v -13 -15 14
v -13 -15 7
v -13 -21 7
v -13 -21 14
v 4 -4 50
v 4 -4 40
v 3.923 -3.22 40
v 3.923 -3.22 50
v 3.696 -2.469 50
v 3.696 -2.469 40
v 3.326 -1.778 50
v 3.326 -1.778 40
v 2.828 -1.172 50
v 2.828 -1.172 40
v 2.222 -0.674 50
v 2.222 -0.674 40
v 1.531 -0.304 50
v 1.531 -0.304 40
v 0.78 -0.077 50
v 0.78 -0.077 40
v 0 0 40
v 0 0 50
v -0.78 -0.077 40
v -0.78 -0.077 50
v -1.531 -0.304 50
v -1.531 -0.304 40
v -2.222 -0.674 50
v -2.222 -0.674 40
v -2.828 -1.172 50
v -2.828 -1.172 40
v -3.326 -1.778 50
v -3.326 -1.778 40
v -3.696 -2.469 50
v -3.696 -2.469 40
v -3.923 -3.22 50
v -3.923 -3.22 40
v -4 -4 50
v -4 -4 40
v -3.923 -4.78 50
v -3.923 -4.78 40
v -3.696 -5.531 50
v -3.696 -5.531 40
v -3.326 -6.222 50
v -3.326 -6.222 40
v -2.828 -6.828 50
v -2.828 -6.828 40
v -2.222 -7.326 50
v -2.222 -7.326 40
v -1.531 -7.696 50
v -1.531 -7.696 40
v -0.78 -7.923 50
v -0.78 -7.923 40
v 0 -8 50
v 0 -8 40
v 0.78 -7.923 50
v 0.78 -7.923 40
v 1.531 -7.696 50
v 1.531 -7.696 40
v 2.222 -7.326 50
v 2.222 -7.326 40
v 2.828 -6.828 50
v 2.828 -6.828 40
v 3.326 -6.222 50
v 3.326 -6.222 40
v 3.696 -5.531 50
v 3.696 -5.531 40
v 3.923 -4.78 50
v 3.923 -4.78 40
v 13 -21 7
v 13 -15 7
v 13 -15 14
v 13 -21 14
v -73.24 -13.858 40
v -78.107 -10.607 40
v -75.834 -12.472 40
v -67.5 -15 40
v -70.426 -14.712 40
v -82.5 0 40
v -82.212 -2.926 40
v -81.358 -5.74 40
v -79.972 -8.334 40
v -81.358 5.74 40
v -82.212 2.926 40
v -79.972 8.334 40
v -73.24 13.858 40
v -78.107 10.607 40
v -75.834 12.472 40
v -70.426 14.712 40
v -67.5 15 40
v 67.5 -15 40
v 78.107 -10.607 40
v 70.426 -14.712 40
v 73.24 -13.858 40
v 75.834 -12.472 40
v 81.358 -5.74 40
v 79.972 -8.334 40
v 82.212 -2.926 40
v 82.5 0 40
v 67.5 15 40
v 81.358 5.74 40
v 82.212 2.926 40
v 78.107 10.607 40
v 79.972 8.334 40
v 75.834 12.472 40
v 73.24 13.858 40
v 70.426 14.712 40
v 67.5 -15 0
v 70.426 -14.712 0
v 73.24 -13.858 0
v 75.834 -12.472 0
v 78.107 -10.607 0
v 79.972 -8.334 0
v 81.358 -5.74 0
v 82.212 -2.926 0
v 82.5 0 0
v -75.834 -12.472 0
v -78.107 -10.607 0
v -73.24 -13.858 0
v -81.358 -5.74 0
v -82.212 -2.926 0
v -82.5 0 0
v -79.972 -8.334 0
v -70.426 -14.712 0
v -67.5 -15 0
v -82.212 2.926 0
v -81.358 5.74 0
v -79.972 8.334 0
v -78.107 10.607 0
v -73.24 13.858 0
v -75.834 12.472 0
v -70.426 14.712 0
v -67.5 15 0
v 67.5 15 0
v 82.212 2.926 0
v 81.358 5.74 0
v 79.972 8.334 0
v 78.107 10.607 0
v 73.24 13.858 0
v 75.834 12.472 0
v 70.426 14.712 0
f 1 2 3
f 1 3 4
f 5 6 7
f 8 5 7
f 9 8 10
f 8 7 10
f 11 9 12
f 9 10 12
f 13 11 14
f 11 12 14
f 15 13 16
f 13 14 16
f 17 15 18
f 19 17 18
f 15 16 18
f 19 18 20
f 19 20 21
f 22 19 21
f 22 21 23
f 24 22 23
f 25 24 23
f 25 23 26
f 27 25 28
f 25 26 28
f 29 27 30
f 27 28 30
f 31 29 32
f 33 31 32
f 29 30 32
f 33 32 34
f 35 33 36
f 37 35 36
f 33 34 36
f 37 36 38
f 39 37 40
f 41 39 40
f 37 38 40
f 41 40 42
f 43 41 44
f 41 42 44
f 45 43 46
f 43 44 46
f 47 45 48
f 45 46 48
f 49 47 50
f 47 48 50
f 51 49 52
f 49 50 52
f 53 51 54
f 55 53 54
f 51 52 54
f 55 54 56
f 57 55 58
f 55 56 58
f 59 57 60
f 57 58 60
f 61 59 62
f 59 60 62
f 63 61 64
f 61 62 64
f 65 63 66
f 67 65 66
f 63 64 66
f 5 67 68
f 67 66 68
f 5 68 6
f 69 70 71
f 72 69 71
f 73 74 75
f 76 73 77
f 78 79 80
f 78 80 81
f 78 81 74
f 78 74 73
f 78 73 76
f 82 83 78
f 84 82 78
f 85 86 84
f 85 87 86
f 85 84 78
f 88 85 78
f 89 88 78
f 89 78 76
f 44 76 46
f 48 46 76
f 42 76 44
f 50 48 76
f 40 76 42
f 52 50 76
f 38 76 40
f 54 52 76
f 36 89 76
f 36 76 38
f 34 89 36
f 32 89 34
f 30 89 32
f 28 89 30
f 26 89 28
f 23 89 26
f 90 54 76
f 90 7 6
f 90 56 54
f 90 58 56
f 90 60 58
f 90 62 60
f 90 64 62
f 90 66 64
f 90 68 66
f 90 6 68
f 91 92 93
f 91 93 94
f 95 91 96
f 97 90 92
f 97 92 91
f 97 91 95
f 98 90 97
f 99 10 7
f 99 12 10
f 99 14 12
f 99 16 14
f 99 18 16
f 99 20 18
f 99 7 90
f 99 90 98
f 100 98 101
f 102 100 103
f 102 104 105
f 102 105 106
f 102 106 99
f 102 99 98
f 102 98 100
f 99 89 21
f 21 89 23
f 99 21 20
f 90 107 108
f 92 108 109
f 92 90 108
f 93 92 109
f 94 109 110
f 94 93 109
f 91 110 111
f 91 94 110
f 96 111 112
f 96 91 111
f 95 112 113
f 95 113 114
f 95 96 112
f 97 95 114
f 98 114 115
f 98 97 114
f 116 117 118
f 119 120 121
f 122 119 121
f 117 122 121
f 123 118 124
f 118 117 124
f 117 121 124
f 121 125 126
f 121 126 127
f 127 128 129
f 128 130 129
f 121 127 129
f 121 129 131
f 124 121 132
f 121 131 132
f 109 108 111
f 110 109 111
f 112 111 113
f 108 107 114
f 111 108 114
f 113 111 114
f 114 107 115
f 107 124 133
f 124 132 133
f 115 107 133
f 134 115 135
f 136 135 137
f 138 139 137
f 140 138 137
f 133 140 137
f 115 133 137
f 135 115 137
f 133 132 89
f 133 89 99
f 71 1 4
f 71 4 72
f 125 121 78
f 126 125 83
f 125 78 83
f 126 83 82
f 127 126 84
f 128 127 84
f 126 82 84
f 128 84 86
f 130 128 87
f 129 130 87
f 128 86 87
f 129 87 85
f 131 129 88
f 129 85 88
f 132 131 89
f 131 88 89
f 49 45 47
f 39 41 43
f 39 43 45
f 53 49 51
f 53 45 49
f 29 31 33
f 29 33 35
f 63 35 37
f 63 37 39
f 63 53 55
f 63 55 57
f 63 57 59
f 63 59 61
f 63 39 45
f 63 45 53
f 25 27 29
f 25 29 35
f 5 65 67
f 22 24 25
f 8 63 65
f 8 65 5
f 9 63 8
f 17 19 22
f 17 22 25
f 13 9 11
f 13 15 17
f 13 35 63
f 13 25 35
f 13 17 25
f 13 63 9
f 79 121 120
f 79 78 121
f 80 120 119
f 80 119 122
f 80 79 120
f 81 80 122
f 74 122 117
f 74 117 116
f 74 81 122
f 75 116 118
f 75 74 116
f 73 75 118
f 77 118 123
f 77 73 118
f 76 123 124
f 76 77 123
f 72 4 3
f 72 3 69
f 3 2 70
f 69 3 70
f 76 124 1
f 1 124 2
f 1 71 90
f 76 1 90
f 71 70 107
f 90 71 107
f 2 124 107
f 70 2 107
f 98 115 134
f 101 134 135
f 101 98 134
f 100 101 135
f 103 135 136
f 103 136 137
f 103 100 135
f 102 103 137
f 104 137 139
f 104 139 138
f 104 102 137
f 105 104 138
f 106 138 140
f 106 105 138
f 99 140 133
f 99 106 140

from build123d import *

# Parameters (mm, degrees)
SKETCH1_W           = 165
SKETCH1_H           = 30
BOSS_EXTRUDE1_DEPTH = 40
FILLET1_R           = 15
SKETCH2_W           = 26
SKETCH2_H           = 7
BOSS_EXTRUDE2_DEPTH = 6
SKETCH3_R           = 4
BOSS_EXTRUDE3_DEPTH = 10


with BuildPart() as part:
    # Sketch1 → Boss-Extrude1 (new body)
    with BuildSketch(Plane.XY):
        Rectangle(SKETCH1_W, SKETCH1_H)
    extrude(amount=BOSS_EXTRUDE1_DEPTH)

    # Fillet1
    fillet1_edges = [part.edges().sort_by_distance(p)[0] for p in [
        (-82.5, 15, 20),
        (82.5, -15, 20),
        (-82.5, -15, 20),
        (82.5, 15, 20),
    ]]
    fillet(fillet1_edges, radius=FILLET1_R - 0.0001)  # a hair under: the kernel refuses the full size

    # Sketch2 → Boss-Extrude2 (add)
    with BuildSketch(Plane.XZ.offset(15)):
        with Locations((0, 10.5)):
            Rectangle(SKETCH2_W, SKETCH2_H)
    extrude(amount=BOSS_EXTRUDE2_DEPTH)

    # Sketch3 → Boss-Extrude3 (add)
    with BuildSketch(Plane.XY.offset(40)):
        with Locations((0, -4)):
            Circle(SKETCH3_R)
    extrude(amount=BOSS_EXTRUDE3_DEPTH)


solid = part.part
